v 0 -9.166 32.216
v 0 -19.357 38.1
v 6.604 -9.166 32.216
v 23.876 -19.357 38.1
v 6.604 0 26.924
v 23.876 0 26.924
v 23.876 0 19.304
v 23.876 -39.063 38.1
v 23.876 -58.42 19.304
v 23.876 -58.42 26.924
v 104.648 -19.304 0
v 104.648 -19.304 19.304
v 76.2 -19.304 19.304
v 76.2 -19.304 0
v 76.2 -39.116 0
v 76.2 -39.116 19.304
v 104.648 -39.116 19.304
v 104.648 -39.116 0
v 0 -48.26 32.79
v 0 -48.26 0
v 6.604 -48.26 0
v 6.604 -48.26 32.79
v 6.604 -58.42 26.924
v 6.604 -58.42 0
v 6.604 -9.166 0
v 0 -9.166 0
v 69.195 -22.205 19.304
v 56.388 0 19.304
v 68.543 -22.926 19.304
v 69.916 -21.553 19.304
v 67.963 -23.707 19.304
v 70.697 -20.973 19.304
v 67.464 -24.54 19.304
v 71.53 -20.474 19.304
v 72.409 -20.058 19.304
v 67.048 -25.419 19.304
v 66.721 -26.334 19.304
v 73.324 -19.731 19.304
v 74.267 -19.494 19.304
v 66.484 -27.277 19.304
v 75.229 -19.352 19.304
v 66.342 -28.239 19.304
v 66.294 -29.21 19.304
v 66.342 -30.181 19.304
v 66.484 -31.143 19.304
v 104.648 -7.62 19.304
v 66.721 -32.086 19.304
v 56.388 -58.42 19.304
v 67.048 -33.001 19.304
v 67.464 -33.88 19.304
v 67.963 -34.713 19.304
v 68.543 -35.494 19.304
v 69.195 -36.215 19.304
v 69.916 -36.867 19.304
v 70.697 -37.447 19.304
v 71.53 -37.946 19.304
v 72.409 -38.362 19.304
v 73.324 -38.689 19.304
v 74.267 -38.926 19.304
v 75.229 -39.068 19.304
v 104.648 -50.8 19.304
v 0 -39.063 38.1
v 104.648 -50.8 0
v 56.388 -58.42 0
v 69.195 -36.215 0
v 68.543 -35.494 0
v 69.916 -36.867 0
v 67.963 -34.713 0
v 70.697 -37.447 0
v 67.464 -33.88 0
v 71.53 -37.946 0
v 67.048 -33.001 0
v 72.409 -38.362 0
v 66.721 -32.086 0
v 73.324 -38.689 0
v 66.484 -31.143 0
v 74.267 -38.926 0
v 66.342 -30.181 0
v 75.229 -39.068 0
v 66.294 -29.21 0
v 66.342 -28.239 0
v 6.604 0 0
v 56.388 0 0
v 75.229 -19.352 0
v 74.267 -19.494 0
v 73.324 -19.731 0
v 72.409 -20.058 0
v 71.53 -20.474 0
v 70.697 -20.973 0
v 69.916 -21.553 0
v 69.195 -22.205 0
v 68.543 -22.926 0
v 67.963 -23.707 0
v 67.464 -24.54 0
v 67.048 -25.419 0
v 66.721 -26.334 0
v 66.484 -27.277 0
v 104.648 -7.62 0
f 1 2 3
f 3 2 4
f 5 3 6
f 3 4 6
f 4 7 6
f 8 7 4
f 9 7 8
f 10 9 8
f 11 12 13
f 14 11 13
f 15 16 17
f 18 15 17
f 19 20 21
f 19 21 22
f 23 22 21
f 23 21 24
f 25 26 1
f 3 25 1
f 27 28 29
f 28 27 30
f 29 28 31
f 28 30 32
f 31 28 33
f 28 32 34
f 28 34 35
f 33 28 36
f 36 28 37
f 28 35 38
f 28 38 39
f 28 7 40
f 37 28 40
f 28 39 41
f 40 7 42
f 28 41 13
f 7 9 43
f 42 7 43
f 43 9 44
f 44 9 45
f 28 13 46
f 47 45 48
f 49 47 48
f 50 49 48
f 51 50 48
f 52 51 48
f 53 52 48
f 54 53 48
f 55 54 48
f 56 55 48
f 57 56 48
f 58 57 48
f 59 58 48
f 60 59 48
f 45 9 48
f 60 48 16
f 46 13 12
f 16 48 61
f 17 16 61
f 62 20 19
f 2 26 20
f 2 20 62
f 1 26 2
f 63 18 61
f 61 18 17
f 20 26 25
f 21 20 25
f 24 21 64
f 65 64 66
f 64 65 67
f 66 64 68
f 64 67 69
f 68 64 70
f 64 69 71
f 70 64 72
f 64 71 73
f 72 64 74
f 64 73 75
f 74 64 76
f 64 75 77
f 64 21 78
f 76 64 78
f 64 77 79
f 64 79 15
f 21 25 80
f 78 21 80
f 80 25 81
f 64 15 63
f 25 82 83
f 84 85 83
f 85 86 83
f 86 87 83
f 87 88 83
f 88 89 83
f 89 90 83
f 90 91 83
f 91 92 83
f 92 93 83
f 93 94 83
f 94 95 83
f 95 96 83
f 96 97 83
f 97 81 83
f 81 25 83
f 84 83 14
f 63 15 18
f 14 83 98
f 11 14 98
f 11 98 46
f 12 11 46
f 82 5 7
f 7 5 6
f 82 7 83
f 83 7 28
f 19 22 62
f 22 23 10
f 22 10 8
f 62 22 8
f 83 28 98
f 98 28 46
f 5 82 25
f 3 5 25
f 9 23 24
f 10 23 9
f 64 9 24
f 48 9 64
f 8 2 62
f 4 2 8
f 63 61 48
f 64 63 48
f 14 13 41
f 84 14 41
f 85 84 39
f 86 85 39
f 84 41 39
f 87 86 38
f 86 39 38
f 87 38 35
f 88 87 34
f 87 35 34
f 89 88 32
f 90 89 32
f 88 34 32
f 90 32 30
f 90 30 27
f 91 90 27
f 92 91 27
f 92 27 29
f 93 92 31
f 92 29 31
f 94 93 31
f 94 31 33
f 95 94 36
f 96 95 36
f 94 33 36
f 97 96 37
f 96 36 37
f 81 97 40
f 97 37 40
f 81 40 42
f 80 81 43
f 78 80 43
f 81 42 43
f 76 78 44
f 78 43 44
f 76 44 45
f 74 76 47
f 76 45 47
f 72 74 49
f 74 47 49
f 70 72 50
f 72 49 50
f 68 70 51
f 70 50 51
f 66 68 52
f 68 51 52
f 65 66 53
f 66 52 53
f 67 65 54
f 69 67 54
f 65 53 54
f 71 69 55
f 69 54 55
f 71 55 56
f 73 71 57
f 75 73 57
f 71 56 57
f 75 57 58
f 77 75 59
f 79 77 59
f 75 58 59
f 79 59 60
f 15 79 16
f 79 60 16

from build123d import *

# Parameters (mm, degrees)
F0_W      = 104.648
F0_H      = 38.1
F1_DEPTH  = 58.42
F2_W      = 80.772
F2_H      = 18.796
F3_DEPTH  = 58.42
F5_DEPTH  = 19.304
F6_W      = 9.166194
F6_H      = 38.1
F6_W_2    = 10.16
F7_DEPTH  = 6.604
F9_DEPTH  = 23.876
F11_DEPTH = 23.876


with BuildPart() as f1:
    # F0 (on Front) → F1 (new body)
    with BuildSketch(Plane.XZ):
        with Locations((52.324, 19.05)):
            Rectangle(F0_W, F0_H)
    extrude(amount=F1_DEPTH)

    # F2 (on face) → F3 (cut)
    with BuildSketch(Plane.XZ.offset(58.42)):
        with Locations((64.262, 28.702)):
            Rectangle(F2_W, F2_H)
    extrude(amount=-F3_DEPTH, mode=Mode.SUBTRACT)

    # F4 (on face) → F5 (cut)
    with BuildSketch(Plane.XY.offset(19.304)):
        Polygon((104.648, 0), (56.388, 0), (104.648, -7.62), align=None)
        Polygon((76.2, -39.116), (104.648, -39.116), (104.648, -19.304), (76.2, -19.304), (76.2, -29.21), align=None)
        with BuildLine():
            ThreePointArc((76.2, -19.304), (66.294, -29.21), (76.2, -39.116))
            Line((76.2, -39.116), (76.2, -29.21))
            Line((76.2, -29.21), (76.2, -19.304))
        make_face()
        Polygon((56.388, -58.42), (104.648, -58.42), (104.648, -50.8), align=None)
    extrude(amount=-F5_DEPTH, mode=Mode.SUBTRACT)

    # F6 (on face) → F7 (cut)
    with BuildSketch(Plane(origin=(0, 0, 0), x_dir=(0, -1, 0), z_dir=(-1, 0, 0))):
        with Locations((4.583097, 19.05)):
            Rectangle(F6_W, F6_H)
        with Locations((53.34, 19.05)):
            Rectangle(F6_W_2, F6_H)
    extrude(amount=-F7_DEPTH, mode=Mode.SUBTRACT)

    # F8 (on face) → F9 (cut)
    with BuildSketch(Plane.YZ.offset(23.876)):
        Polygon((-19.3574, 38.1), (0, 26.924), (0, 38.1), align=None)
    extrude(amount=-F9_DEPTH, mode=Mode.SUBTRACT)

    # F10 (on face) → F11 (cut)
    with BuildSketch(Plane.YZ.offset(23.876)):
        Polygon((-58.42, 38.1), (-58.42, 26.924), (-39.0626, 38.1), align=None)
    extrude(amount=-F11_DEPTH, mode=Mode.SUBTRACT)


solid = f1.part
